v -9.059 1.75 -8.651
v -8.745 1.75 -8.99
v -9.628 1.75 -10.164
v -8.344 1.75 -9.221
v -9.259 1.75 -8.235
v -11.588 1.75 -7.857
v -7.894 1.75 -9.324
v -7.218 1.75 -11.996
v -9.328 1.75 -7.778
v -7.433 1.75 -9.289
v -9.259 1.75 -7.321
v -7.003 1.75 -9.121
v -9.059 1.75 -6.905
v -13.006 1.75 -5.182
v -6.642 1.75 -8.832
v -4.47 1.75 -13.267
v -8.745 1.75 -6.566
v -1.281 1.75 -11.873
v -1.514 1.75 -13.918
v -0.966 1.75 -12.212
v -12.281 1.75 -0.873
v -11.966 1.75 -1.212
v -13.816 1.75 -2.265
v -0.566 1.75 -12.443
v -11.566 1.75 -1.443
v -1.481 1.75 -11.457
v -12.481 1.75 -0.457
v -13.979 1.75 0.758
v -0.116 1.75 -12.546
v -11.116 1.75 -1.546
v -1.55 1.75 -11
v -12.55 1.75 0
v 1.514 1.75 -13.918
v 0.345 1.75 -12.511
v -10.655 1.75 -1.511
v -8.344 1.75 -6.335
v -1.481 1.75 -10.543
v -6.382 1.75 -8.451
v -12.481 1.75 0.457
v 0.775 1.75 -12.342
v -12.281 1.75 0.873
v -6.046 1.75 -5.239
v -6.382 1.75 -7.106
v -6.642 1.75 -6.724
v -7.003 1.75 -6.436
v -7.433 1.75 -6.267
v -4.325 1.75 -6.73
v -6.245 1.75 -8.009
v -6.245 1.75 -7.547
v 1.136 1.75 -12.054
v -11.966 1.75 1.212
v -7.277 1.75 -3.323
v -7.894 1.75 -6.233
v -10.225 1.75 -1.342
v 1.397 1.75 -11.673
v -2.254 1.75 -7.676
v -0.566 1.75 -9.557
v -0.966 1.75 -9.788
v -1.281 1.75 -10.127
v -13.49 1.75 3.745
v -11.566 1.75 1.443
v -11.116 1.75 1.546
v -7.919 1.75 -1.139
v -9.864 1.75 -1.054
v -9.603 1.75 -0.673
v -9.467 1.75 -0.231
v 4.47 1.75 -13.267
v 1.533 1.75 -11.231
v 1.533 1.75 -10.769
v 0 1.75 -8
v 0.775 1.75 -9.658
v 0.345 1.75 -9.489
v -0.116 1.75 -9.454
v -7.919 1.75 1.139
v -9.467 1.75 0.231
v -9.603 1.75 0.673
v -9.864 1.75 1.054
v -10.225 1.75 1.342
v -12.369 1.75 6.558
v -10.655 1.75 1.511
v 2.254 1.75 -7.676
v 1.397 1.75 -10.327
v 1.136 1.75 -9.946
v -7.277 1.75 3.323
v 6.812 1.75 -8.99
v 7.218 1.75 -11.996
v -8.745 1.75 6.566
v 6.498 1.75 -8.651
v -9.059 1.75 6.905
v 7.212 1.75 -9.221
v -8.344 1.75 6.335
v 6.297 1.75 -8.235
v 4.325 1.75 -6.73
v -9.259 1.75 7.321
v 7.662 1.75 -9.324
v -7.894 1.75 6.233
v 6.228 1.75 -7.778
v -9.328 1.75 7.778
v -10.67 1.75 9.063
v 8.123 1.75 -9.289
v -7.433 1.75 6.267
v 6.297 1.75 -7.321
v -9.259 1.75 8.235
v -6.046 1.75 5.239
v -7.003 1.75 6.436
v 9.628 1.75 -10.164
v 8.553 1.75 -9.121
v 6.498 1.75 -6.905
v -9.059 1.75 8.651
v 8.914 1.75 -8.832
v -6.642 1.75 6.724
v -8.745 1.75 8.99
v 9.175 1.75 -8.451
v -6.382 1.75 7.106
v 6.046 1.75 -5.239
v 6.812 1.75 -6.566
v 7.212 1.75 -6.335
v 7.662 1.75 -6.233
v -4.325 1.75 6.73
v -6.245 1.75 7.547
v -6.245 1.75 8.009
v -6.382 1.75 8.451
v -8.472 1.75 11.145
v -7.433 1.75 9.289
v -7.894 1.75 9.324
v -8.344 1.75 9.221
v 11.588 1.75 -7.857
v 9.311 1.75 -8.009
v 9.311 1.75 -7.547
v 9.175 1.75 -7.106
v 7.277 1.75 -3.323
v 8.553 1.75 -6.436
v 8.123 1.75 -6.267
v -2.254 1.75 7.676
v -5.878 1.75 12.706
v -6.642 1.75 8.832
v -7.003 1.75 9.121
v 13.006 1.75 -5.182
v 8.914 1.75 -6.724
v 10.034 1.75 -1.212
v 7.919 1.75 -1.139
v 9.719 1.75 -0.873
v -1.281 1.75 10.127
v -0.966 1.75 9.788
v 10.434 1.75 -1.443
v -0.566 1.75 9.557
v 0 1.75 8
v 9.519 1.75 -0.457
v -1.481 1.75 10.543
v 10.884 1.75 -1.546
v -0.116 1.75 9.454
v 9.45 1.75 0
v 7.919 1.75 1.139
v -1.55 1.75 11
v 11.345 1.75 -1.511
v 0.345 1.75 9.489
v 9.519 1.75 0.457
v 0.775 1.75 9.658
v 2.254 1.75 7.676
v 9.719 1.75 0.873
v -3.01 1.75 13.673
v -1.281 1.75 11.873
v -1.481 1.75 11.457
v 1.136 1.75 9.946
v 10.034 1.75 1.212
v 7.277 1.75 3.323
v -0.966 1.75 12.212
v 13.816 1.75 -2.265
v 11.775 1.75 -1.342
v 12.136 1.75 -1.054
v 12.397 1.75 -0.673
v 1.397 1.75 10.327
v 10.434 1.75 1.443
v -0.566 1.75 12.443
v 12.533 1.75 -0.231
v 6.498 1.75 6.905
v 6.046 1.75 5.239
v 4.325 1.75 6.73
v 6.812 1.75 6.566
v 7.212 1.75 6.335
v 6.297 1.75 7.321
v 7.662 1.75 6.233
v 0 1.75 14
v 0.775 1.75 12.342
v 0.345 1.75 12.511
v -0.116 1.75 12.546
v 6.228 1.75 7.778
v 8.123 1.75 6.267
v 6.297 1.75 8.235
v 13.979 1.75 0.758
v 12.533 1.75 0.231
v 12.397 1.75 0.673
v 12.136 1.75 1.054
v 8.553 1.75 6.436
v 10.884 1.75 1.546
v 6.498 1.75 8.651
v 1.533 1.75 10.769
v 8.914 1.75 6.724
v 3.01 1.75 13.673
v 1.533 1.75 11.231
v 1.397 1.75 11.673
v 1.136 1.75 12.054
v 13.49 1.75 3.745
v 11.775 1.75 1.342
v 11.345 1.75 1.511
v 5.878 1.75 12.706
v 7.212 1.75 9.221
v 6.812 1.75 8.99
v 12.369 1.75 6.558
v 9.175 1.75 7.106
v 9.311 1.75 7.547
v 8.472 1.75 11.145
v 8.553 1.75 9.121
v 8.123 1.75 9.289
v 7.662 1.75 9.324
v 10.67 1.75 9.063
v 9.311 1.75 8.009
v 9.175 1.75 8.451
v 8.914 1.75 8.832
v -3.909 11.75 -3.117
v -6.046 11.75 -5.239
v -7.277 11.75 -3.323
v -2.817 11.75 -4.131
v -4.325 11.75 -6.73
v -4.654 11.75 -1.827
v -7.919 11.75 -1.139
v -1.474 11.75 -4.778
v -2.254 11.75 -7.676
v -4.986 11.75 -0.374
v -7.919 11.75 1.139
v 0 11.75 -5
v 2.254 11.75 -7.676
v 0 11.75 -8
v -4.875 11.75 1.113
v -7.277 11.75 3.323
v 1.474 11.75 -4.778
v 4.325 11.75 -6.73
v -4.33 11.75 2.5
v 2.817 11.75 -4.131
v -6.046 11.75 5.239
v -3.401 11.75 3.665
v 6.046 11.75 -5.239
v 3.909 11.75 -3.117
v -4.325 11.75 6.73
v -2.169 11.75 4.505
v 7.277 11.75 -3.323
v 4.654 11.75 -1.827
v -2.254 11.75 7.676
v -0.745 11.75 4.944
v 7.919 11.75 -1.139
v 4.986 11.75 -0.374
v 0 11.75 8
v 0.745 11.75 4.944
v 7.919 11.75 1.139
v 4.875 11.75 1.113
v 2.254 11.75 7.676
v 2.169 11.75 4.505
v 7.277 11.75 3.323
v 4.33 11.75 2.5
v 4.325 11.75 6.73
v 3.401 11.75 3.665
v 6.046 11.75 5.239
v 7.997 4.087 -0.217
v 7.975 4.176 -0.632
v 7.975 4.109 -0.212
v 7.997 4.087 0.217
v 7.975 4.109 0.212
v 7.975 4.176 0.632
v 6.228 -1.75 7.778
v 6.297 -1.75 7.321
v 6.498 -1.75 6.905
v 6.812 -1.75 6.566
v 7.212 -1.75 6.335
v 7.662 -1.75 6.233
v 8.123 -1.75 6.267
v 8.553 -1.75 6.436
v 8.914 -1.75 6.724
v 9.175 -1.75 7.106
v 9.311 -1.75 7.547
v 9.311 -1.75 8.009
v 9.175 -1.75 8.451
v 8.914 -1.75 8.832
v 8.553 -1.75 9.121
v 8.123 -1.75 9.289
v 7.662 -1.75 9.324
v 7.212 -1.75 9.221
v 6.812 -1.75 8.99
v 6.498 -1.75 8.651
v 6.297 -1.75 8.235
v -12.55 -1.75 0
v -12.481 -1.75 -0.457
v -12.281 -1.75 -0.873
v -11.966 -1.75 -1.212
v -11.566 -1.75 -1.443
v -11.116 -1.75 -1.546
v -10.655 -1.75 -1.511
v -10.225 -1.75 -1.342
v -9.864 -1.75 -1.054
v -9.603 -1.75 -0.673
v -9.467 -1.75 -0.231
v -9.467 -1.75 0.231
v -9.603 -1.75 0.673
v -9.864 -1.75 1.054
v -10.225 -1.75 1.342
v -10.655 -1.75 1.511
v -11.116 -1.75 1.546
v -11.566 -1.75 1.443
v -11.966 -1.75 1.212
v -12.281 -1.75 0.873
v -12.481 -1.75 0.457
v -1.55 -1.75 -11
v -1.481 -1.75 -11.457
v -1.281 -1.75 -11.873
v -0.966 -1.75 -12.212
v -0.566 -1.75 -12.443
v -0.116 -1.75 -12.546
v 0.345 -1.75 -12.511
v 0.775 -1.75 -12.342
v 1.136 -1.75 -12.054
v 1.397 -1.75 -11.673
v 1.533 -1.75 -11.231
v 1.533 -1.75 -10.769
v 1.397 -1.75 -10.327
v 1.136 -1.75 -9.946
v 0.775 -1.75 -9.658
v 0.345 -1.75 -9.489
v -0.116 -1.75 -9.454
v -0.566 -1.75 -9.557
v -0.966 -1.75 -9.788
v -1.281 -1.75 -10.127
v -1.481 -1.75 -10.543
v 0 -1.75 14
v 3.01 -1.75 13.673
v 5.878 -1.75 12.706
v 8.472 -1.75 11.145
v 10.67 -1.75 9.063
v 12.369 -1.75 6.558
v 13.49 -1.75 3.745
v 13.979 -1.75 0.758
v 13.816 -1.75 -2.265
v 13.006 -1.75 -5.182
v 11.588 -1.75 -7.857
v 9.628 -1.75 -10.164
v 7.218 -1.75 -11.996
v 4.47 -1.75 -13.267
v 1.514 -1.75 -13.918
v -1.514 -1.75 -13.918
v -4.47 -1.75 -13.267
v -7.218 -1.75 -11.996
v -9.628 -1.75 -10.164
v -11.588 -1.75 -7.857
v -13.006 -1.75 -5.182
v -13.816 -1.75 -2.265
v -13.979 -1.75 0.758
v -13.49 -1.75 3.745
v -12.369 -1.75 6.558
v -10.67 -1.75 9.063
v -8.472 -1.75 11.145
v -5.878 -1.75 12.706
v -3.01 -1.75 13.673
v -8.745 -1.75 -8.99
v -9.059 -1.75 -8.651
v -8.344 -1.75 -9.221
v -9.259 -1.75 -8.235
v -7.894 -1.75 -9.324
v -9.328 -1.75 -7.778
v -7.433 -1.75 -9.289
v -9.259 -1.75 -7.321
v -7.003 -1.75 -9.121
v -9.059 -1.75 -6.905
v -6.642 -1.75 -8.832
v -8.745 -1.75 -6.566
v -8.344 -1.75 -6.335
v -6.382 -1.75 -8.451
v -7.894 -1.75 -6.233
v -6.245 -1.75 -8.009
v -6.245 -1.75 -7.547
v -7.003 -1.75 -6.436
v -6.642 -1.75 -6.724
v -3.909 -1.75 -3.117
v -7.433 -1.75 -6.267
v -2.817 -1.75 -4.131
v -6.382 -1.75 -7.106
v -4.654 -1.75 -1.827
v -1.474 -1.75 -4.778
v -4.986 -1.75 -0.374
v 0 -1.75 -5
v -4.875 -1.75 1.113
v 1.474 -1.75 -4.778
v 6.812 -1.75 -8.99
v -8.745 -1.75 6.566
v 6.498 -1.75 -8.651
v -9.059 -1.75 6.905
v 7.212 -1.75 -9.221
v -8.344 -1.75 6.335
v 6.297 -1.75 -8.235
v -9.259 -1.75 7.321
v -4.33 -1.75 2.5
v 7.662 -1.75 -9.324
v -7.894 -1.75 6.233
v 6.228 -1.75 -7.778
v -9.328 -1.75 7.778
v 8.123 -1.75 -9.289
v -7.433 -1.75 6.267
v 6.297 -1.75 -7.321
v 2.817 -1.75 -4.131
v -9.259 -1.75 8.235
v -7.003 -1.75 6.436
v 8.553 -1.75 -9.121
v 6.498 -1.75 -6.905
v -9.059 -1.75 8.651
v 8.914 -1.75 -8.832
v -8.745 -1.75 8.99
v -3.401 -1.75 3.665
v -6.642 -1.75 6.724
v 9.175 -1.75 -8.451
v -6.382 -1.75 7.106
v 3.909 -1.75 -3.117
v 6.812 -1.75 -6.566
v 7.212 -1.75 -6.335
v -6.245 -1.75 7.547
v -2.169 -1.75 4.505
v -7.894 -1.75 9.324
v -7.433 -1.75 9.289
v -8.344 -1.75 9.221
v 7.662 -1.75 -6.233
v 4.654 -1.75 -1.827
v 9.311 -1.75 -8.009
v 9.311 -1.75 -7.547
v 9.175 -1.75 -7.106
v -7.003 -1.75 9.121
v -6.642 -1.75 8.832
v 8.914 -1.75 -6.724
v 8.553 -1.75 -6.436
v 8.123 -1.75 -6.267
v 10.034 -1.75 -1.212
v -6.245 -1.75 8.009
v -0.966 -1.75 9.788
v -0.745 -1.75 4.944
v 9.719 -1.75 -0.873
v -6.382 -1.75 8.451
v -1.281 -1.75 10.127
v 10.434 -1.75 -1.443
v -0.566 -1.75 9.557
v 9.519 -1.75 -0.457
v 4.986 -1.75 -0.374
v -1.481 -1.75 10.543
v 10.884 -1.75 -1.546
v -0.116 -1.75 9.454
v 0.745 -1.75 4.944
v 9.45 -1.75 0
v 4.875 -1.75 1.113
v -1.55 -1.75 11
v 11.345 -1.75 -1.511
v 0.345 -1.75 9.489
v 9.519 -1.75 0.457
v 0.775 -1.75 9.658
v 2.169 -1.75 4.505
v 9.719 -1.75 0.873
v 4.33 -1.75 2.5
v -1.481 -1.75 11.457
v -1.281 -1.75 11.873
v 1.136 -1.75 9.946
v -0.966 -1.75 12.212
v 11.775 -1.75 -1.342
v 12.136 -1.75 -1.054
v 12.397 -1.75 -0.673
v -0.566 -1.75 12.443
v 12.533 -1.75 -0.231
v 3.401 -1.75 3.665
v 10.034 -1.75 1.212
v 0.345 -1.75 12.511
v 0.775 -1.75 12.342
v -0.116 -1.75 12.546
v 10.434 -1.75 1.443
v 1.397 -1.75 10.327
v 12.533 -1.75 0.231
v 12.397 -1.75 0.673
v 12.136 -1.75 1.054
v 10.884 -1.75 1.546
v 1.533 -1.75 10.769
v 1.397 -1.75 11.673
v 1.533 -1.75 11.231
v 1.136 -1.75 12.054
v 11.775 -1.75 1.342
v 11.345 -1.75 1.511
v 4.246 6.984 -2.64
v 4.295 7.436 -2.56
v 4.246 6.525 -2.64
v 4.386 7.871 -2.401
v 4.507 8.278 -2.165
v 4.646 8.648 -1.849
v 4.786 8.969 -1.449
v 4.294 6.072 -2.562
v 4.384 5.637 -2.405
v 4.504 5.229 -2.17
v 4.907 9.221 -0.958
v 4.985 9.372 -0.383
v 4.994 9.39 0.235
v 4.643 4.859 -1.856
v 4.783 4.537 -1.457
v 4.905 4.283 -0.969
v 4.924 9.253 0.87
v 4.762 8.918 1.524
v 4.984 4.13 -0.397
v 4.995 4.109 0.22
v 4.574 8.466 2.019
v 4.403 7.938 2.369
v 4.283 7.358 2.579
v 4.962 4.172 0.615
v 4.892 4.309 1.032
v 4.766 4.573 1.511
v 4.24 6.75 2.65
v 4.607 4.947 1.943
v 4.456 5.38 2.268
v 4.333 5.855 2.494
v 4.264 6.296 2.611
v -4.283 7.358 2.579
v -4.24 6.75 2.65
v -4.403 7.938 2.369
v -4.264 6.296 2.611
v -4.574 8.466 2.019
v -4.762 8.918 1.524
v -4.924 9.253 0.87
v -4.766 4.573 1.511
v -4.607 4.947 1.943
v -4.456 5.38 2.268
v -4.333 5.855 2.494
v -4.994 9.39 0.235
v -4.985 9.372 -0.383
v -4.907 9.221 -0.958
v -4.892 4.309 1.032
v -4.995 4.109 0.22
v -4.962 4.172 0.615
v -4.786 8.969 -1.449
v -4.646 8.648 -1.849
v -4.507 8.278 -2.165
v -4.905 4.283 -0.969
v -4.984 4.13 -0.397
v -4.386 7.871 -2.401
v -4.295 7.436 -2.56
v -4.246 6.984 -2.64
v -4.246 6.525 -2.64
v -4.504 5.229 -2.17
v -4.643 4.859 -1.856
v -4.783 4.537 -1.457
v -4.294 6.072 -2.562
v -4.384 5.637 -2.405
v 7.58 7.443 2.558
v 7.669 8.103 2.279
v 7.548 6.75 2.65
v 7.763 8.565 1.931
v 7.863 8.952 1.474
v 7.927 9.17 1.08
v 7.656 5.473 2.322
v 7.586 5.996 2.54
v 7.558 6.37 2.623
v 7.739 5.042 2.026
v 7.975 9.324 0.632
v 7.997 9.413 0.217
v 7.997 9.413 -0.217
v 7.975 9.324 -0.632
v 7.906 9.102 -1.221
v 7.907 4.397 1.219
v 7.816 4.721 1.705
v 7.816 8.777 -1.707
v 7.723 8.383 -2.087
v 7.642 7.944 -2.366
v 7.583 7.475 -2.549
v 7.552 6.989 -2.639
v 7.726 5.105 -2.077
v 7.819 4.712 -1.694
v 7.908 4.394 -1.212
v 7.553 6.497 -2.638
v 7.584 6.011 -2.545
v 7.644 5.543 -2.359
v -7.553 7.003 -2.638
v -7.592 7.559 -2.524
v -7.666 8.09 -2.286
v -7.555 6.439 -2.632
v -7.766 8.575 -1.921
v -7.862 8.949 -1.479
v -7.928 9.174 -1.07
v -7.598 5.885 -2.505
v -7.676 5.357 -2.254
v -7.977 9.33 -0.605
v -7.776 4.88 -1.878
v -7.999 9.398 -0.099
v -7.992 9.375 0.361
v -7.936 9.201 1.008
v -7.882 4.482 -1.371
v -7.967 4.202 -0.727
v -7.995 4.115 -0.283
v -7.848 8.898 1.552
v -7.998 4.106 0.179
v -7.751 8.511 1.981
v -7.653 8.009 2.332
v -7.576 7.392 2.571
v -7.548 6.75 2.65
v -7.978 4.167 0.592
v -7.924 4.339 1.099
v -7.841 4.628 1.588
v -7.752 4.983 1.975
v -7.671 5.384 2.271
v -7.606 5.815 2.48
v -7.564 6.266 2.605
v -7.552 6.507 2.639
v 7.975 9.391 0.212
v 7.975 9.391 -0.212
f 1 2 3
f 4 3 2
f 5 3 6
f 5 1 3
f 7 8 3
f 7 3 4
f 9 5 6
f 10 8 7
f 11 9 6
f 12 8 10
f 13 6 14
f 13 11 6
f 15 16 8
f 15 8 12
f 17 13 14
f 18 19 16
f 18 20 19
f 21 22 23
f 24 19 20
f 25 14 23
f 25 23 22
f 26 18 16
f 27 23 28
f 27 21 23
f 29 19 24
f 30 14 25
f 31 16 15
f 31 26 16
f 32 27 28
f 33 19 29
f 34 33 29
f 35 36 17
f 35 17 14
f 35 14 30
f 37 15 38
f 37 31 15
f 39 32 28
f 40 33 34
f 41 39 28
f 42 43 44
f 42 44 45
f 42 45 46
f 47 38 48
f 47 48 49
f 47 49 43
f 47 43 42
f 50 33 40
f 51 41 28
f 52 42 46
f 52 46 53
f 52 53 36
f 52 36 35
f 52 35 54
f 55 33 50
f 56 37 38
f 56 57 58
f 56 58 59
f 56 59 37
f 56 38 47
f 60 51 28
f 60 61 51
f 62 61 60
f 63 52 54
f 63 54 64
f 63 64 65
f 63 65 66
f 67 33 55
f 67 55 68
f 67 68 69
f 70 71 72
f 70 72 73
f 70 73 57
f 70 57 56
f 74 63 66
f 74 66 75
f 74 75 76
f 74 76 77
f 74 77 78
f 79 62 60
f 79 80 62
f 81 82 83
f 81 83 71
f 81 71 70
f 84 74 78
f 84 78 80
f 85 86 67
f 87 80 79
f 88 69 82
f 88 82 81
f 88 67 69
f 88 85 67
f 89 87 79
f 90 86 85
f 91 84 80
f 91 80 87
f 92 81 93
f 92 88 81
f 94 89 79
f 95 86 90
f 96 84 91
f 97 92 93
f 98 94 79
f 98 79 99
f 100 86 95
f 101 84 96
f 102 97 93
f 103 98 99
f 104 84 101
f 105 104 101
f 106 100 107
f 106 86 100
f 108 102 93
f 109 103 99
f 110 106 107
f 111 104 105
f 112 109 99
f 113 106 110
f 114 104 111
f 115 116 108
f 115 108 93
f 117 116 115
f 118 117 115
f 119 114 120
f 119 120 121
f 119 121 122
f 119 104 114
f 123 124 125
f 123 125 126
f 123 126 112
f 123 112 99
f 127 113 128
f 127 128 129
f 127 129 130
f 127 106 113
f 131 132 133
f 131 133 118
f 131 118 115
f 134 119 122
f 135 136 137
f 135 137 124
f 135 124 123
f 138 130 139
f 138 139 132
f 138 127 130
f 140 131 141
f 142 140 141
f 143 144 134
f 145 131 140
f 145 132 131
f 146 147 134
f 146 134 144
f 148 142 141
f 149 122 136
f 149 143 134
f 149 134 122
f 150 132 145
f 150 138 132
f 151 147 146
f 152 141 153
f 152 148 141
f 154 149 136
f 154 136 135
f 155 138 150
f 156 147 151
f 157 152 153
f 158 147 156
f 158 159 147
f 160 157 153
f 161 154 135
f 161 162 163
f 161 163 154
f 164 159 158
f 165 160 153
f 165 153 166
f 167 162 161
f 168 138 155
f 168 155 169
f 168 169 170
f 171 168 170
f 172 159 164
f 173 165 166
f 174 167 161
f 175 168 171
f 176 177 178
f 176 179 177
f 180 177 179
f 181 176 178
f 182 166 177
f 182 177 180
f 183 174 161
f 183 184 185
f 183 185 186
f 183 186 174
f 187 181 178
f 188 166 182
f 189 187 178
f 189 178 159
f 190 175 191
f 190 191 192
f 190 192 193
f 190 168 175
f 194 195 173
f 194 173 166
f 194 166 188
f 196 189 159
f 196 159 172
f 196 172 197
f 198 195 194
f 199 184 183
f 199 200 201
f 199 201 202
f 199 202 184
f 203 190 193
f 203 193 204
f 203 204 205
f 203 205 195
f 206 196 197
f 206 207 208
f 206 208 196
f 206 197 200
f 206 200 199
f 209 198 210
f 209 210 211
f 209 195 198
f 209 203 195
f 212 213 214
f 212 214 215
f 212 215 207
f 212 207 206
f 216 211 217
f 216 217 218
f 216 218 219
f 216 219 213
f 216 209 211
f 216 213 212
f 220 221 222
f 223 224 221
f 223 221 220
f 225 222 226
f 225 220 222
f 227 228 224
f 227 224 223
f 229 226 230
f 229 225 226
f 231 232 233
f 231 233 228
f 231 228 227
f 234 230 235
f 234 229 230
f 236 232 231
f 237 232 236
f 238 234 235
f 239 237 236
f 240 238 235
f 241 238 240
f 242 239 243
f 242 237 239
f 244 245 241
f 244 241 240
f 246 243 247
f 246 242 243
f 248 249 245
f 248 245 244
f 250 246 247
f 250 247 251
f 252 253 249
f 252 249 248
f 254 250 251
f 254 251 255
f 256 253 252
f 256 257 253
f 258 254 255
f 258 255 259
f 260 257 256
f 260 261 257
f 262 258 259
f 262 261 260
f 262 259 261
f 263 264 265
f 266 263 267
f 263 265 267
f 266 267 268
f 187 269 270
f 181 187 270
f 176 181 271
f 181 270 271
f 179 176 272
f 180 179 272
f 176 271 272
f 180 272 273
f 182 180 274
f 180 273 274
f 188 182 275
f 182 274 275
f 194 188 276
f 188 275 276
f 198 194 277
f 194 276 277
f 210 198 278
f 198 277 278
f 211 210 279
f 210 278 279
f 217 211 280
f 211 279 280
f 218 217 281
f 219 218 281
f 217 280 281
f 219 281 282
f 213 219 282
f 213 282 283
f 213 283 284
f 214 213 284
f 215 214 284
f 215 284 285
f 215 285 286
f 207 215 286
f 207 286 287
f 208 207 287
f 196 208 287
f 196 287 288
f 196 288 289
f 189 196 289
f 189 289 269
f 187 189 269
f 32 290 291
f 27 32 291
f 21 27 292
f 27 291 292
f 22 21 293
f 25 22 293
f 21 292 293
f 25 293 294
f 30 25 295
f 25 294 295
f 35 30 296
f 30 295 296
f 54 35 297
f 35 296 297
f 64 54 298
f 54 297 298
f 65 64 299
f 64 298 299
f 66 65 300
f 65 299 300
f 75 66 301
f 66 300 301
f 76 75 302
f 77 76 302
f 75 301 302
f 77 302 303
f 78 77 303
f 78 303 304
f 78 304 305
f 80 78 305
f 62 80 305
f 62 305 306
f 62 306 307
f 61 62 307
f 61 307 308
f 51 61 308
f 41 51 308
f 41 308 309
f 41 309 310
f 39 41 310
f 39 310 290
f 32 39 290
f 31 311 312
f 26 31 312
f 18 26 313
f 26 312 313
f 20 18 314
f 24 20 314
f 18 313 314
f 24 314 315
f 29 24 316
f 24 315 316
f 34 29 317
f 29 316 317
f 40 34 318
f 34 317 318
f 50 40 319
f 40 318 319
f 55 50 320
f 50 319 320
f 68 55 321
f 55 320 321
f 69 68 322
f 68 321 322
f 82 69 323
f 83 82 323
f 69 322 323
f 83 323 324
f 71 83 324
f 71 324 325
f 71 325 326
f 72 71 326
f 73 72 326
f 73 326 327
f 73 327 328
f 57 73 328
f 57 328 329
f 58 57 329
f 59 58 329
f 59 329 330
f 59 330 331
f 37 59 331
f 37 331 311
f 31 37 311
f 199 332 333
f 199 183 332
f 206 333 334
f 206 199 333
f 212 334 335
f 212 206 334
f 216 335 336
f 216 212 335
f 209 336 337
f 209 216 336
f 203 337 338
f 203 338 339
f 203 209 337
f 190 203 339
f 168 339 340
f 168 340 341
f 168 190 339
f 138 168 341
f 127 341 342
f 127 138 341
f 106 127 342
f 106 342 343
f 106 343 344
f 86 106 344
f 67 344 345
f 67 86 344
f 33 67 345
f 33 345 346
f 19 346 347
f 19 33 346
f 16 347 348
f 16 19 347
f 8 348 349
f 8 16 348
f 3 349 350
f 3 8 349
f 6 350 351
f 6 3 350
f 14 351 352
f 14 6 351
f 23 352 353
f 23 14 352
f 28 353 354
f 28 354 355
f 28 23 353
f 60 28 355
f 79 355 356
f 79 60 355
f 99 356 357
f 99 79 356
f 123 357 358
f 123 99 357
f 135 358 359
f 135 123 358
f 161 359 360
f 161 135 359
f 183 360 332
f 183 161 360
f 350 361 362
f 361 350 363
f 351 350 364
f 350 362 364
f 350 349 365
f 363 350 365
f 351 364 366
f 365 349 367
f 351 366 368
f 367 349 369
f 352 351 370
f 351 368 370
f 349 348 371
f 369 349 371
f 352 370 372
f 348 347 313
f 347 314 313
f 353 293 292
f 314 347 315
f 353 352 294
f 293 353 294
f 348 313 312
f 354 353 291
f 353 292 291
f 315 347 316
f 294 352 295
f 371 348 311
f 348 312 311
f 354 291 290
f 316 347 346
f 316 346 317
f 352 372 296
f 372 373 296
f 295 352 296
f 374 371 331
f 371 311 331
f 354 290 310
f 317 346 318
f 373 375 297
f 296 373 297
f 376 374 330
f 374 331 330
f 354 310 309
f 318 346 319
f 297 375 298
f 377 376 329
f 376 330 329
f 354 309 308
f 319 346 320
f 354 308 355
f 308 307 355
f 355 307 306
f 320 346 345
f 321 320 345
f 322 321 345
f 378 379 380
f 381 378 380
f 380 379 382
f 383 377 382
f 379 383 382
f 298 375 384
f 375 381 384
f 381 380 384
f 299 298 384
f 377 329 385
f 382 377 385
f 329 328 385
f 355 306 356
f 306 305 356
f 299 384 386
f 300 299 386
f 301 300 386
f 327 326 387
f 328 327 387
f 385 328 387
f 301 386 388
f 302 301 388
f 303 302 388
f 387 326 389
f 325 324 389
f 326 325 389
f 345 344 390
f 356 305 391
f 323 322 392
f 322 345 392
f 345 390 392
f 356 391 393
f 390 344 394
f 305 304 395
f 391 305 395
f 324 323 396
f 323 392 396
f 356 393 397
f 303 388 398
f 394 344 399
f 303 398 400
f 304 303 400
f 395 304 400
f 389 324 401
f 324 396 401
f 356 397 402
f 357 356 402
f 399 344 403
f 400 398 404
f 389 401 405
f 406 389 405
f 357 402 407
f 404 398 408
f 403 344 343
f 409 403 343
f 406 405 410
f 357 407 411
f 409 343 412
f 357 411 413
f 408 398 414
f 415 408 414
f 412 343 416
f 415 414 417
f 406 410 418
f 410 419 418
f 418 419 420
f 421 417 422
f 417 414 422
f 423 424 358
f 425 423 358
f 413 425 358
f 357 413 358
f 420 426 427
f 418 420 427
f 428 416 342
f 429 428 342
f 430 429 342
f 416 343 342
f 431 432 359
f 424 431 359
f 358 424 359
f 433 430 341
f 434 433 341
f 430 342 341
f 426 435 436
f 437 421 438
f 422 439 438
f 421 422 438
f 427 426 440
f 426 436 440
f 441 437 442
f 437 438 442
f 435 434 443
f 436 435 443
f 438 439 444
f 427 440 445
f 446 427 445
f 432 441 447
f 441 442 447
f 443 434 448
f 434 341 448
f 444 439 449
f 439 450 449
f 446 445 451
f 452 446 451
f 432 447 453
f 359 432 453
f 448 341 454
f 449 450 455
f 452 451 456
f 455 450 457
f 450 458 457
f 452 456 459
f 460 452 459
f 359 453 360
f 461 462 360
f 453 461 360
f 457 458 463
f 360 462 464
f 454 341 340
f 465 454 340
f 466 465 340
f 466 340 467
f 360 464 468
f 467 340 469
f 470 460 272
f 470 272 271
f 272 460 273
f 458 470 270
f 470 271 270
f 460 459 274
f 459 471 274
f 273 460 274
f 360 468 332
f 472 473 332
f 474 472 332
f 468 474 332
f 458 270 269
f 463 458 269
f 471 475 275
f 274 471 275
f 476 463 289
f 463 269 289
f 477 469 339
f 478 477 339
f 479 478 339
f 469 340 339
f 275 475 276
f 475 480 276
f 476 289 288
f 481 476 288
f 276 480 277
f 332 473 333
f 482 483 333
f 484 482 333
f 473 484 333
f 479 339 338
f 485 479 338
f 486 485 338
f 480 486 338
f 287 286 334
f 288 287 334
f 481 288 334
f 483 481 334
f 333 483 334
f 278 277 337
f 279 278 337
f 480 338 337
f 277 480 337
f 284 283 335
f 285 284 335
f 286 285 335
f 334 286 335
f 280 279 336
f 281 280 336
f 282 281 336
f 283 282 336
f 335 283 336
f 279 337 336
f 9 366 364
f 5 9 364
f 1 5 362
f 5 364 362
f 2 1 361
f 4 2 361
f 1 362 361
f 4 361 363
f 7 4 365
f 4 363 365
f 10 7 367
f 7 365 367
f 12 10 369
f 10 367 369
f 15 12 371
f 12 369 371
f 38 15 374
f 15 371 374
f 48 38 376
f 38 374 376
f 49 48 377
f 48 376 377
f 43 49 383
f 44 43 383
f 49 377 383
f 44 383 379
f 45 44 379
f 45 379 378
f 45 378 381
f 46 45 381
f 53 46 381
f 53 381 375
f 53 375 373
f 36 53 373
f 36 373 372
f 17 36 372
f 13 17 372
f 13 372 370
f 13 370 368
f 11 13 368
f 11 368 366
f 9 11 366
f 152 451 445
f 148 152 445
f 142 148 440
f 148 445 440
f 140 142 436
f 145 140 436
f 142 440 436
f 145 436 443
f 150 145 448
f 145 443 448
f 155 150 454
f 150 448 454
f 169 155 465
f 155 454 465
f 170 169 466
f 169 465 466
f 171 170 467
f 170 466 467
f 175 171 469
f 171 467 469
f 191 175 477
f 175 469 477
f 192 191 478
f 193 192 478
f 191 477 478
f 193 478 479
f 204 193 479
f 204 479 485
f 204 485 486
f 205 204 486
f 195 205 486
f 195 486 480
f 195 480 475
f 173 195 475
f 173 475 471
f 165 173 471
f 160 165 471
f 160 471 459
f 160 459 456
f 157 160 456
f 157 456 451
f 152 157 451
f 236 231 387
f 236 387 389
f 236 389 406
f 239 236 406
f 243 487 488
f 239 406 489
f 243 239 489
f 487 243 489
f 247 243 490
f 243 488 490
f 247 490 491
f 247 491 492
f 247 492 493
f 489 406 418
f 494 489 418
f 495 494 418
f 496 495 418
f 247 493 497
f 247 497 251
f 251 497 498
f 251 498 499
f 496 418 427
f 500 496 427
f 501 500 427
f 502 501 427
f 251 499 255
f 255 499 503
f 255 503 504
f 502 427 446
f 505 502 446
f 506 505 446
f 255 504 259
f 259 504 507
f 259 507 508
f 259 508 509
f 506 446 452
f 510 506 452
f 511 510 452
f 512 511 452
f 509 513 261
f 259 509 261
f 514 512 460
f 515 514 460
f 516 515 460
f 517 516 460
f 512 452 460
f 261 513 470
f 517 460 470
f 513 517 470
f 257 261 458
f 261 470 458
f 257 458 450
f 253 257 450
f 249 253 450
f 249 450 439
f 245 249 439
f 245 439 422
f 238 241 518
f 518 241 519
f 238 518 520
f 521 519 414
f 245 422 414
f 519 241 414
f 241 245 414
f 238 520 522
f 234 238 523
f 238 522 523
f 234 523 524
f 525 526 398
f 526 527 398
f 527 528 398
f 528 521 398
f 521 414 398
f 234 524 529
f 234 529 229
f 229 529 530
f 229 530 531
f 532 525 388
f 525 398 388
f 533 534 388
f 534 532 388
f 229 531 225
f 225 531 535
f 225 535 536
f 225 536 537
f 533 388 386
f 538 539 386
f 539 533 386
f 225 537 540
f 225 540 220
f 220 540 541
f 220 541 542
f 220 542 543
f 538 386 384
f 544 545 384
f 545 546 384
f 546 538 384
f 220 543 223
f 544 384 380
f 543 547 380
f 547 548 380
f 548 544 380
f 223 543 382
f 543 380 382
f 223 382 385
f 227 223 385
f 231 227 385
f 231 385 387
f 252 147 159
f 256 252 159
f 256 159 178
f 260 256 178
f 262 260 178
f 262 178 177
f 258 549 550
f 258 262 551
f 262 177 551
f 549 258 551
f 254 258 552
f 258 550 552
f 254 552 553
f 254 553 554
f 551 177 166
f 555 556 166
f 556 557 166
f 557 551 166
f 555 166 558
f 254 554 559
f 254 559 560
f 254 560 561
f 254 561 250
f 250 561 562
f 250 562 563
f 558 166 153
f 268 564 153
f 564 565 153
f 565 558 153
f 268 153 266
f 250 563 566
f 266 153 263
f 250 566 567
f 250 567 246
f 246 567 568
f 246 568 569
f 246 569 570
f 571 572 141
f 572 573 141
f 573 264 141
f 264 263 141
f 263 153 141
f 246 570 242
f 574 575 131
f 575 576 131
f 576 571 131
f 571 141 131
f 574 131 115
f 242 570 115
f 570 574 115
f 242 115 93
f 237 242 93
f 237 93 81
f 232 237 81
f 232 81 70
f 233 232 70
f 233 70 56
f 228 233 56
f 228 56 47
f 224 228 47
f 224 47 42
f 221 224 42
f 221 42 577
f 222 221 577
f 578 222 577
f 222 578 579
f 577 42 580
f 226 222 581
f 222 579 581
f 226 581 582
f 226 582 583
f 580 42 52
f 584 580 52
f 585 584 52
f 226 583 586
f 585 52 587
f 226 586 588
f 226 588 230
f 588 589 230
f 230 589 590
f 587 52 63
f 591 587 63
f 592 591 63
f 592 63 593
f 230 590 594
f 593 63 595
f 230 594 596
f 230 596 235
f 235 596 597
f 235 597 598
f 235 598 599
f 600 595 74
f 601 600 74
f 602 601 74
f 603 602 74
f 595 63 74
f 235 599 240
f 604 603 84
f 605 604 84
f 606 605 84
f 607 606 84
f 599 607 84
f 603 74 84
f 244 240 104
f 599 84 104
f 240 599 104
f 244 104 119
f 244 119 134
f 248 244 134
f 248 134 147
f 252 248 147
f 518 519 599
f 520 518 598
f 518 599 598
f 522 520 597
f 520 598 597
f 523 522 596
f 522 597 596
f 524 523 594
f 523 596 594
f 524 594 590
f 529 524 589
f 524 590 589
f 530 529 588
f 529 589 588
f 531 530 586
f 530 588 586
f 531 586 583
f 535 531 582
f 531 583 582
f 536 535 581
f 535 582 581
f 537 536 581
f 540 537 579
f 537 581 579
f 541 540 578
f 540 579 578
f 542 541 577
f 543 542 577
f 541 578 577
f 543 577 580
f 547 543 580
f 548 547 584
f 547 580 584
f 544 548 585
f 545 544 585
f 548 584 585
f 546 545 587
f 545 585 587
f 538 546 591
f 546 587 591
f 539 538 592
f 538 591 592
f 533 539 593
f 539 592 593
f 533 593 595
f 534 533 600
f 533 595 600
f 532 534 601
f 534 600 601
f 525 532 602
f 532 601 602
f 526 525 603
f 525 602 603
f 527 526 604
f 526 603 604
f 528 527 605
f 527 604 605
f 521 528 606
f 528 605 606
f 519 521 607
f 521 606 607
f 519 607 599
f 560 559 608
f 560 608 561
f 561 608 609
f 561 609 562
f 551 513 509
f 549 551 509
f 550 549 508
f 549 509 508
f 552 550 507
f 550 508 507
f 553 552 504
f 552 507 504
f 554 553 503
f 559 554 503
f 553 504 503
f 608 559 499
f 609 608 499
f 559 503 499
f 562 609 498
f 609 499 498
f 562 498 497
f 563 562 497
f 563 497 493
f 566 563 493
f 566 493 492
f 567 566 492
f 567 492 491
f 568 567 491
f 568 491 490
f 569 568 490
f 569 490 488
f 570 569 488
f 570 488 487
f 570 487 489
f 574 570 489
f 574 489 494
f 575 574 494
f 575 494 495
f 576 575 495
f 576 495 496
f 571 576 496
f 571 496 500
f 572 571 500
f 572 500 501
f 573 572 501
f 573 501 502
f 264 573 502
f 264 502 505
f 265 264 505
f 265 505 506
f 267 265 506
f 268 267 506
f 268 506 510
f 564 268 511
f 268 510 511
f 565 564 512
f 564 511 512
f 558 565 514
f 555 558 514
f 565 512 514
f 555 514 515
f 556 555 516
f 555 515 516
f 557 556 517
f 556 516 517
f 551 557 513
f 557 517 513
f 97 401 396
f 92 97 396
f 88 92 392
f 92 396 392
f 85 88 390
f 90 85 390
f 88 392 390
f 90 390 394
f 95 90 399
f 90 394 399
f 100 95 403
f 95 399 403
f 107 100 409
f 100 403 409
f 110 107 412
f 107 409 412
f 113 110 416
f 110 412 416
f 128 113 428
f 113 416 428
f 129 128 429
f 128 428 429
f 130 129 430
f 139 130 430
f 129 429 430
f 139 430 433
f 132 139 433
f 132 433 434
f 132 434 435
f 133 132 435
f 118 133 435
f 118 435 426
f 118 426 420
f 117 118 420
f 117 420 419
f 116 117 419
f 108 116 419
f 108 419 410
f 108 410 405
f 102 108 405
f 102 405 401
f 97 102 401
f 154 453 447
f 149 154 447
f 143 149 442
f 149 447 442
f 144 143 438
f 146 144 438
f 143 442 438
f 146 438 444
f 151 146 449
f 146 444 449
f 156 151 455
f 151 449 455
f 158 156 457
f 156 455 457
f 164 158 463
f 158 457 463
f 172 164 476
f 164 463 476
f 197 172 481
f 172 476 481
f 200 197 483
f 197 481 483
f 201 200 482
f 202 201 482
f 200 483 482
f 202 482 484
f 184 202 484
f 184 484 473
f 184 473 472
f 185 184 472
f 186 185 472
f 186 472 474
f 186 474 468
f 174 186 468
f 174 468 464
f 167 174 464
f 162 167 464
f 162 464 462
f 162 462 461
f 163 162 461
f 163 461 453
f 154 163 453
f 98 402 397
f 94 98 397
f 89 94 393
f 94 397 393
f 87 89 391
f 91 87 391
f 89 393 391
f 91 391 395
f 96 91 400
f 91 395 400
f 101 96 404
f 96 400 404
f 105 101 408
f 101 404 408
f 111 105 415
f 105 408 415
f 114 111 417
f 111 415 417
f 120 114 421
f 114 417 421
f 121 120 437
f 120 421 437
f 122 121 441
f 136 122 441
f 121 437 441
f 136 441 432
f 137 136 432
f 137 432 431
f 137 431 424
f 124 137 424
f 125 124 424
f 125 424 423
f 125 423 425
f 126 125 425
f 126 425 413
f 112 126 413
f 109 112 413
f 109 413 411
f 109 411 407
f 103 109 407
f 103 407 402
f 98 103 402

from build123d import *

# Parameters (mm, degrees)
SKETCH1_R                      = 14
BOSS_EXTRUDE1_DEPTH            = 1.75
M2_5_CLEARANCE_HOLE1_D         = 3.1
M2_5_CLEARANCE_HOLE1_DEPTH     = 6
M2_5_CLEARANCE_HOLE1_TIP       = 0.931333959
SKETCH9_R                      = 8
BOSS_EXTRUDE2_DEPTH            = 10
SKETCH7_R                      = 5
CUT_EXTRUDE1_DEPTH             = 24.963513933
M5_CLEARANCE_HOLE1_D           = 5.3
M5_CLEARANCE_HOLE1_DEPTH       = 25.4
M5_CLEARANCE_HOLE1_CSINK_D     = 5.35
M5_CLEARANCE_HOLE1_CSINK_ANGLE = 90
M5_CLEARANCE_HOLE1_TIP         = 1.59228064


with BuildPart() as part:
    # Sketch1 → Boss-Extrude1 (new, symmetric)
    with BuildSketch(Plane(origin=(0, 0, 0), x_dir=(1, 0, 0), z_dir=(0, 1, 0))):
        with Locations(Location((0, 0, 0), (0, 0, 270))):
            Circle(SKETCH1_R)
    extrude(amount=BOSS_EXTRUDE1_DEPTH, both=True)

    # M2.5 Clearance Hole1
    with Locations(Plane(origin=(0, 1.75, 0), x_dir=(1, 0, 0), z_dir=(0, 1, 0))):
        with Locations((-11, 0), (-7.778174593, 7.778174593), (0, 11), (7.778174593, 7.778174593), (11, 0), (7.778174593, -7.778174593), (0, -11), (-7.778174593, -7.778174593)):
            Hole(M2_5_CLEARANCE_HOLE1_D / 2, depth=M2_5_CLEARANCE_HOLE1_DEPTH)
            with Locations((0, 0, -(M2_5_CLEARANCE_HOLE1_DEPTH + M2_5_CLEARANCE_HOLE1_TIP / 2))):  # 118° drill point
                Cone(0, M2_5_CLEARANCE_HOLE1_D / 2, M2_5_CLEARANCE_HOLE1_TIP, mode=Mode.SUBTRACT)

    # Sketch9 → Boss-Extrude2 (add)
    with BuildSketch(Plane(origin=(0, 1.75, 0), x_dir=(1, 0, 0), z_dir=(0, 1, 0))):
        with Locations(Location((0, 0, 0), (0, 0, 270))):
            Circle(SKETCH9_R)
    extrude(amount=BOSS_EXTRUDE2_DEPTH)

    # Sketch7 → Cut-Extrude1 (cut, through all)
    with BuildSketch(Plane.XZ.offset(1.75)):
        with Locations(Location((0, 0, 0), (0, 0, 270))):
            Circle(SKETCH7_R)
    extrude(amount=-CUT_EXTRUDE1_DEPTH, mode=Mode.SUBTRACT)

    # M5 Clearance Hole1
    with Locations(Plane(origin=(8, 0, 0), x_dir=(0, 0, -1), z_dir=(1, 0, 0))):
        with Locations((0, 6.75)):
            CounterSinkHole(M5_CLEARANCE_HOLE1_D / 2, M5_CLEARANCE_HOLE1_CSINK_D / 2, depth=M5_CLEARANCE_HOLE1_DEPTH, counter_sink_angle=M5_CLEARANCE_HOLE1_CSINK_ANGLE)
            with Locations((0, 0, -(M5_CLEARANCE_HOLE1_DEPTH + M5_CLEARANCE_HOLE1_TIP / 2))):  # 118° drill point
                Cone(0, M5_CLEARANCE_HOLE1_D / 2, M5_CLEARANCE_HOLE1_TIP, mode=Mode.SUBTRACT)


solid = part.part
